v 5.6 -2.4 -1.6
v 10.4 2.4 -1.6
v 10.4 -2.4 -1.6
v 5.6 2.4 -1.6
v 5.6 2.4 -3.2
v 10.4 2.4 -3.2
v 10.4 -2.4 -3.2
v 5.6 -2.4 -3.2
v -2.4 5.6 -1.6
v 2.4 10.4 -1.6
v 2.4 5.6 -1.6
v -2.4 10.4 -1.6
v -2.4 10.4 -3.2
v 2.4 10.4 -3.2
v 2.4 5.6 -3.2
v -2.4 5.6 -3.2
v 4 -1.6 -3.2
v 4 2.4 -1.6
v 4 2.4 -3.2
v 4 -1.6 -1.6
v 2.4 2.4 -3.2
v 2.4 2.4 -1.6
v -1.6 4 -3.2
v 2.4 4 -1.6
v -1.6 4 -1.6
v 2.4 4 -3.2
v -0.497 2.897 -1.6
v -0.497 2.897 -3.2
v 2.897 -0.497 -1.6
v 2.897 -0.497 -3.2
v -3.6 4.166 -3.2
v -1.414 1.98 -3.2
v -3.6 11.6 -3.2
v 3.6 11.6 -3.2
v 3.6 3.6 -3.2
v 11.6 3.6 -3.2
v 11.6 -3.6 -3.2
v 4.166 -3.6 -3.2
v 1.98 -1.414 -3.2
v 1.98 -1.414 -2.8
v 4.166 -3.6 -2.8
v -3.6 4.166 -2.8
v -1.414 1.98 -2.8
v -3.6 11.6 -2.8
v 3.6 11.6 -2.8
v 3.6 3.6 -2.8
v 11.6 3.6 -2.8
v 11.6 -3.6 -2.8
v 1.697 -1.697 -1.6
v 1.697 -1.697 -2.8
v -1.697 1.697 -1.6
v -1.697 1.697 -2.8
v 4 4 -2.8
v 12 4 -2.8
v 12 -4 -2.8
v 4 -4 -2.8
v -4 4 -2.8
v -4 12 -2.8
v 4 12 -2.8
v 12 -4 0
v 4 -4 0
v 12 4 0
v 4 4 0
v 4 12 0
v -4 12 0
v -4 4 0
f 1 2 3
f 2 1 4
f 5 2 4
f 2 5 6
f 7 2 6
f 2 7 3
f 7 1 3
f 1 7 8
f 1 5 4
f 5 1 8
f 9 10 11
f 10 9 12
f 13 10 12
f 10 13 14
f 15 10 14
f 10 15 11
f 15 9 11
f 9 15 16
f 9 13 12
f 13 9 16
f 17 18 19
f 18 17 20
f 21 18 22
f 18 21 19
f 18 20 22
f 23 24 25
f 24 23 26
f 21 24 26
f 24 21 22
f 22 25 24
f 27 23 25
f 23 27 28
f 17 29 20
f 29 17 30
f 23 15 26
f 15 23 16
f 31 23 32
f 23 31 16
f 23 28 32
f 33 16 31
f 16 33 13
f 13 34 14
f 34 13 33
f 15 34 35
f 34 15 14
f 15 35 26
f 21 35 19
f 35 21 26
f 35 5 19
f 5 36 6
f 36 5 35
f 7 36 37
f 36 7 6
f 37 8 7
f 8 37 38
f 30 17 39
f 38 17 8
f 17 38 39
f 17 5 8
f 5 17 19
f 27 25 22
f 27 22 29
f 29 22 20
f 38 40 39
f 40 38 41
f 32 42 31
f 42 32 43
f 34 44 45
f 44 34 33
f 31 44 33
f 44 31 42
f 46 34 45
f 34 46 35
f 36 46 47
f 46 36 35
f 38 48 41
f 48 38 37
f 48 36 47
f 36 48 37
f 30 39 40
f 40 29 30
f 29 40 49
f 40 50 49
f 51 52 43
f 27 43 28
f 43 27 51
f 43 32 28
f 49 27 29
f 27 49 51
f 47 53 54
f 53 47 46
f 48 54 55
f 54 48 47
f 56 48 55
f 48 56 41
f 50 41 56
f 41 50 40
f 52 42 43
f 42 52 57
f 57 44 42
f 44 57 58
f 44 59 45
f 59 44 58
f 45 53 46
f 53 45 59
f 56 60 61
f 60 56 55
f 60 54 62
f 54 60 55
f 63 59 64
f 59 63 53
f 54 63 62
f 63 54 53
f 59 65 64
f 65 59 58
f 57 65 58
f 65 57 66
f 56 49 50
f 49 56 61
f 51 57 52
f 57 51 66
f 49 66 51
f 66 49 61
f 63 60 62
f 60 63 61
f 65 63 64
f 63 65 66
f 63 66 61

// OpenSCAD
// file: ../p/4-4edge.scad
use <../lib.scad>
$fa=1; $fs=0.2;
function ldraw_lib__4_4edge(realsolid=false) = [
// 0 Circle 1.0
// 0 Name: 4-4edge.dat
// 0 Author: James Jessiman
// 0 !LDRAW_ORG Primitive UPDATE 2017-01
// 0 !LICENSE Licensed under CC BY 2.0 and CC BY 4.0 : see CAreadme.txt
// 
// 0 BFC CERTIFY CCW
  [0,"BFC","CERTIFY"],
  [0,"BFC","CCW"],
// 
// 0 !HISTORY 1998-12-15 [PTadmin] Official Update 1998-10
// 0 !HISTORY 2005-12-28 [PTadmin] Official Update 2005-01
// 0 !HISTORY 2007-06-24 [PTadmin] Header formatted for Contributor Agreement
// 0 !HISTORY 2008-07-01 [PTadmin] Official Update 2008-01
// 0 !HISTORY 2017-01-15 [Steffen] BFCed
// 0 !HISTORY 2017-12-30 [PTadmin] Official Update 2017-01
// 
// 
// 2 24 1 0 0 0.9239 0 0.3827
  [2,24,1,0,0,0.9239,0,0.3827],
// 2 24 0.9239 0 0.3827 0.7071 0 0.7071
  [2,24,0.9239,0,0.3827,0.7071,0,0.7071],
// 2 24 0.7071 0 0.7071 0.3827 0 0.9239
  [2,24,0.7071,0,0.7071,0.3827,0,0.9239],
// 2 24 0.3827 0 0.9239 0 0 1
  [2,24,0.3827,0,0.9239,0,0,1],
// 2 24 0 0 1 -0.3827 0 0.9239
  [2,24,0,0,1,-0.3827,0,0.9239],
// 2 24 -0.3827 0 0.9239 -0.7071 0 0.7071
  [2,24,-0.3827,0,0.9239,-0.7071,0,0.7071],
// 2 24 -0.7071 0 0.7071 -0.9239 0 0.3827
  [2,24,-0.7071,0,0.7071,-0.9239,0,0.3827],
// 2 24 -0.9239 0 0.3827 -1 0 -0
  [2,24,-0.9239,0,0.3827,-1,0,-0],
// 2 24 -1 0 -0 -0.9239 0 -0.3827
  [2,24,-1,0,-0,-0.9239,0,-0.3827],
// 2 24 -0.9239 0 -0.3827 -0.7071 0 -0.7071
  [2,24,-0.9239,0,-0.3827,-0.7071,0,-0.7071],
// 2 24 -0.7071 0 -0.7071 -0.3827 0 -0.9239
  [2,24,-0.7071,0,-0.7071,-0.3827,0,-0.9239],
// 2 24 -0.3827 0 -0.9239 0 0 -1
  [2,24,-0.3827,0,-0.9239,0,0,-1],
// 2 24 0 0 -1 0.3827 0 -0.9239
  [2,24,0,0,-1,0.3827,0,-0.9239],
// 2 24 0.3827 0 -0.9239 0.7071 0 -0.7071
  [2,24,0.3827,0,-0.9239,0.7071,0,-0.7071],
// 2 24 0.7071 0 -0.7071 0.9239 0 -0.3827
  [2,24,0.7071,0,-0.7071,0.9239,0,-0.3827],
// 2 24 0.9239 0 -0.3827 1 0 0
  [2,24,0.9239,0,-0.3827,1,0,0],
];
module ldraw_lib__4_4edge(step=0, col=false, unit=2/5, alt=false, line=0.2, solid=!$preview)
    makepoly(ldraw_lib__4_4edge(solid), step=step, col=col, unit=unit, alt=alt, line=line, solid=solid);
ldraw_lib__4_4edge(line=0.2);
// file: ../p/4-4disc.scad
use <../lib.scad>
$fa=1; $fs=0.2;
function ldraw_lib__4_4disc(realsolid=false) = [
// 0 Disc 1.0
// 0 Name: 4-4disc.dat
// 0 Author: James Jessiman
// 0 !LDRAW_ORG Primitive UPDATE 2002-02
// 0 !LICENSE Licensed under CC BY 2.0 and CC BY 4.0 : see CAreadme.txt
// 
// 0 BFC CERTIFY CCW
  [0,"BFC","CERTIFY"],
  [0,"BFC","CCW"],
// 
// 0 !HISTORY 1998-12-15 [PTadmin] Official Update 1998-10
// 0 !HISTORY 2002-03-23 [sbliss] Added BFC statement
// 0 !HISTORY 2002-04-25 [PTadmin] Official Update 2002-02
// 0 !HISTORY 2007-06-24 [PTadmin] Header formatted for Contributor Agreement
// 0 !HISTORY 2008-07-01 [PTadmin] Official Update 2008-01
// 
// 
// 3 16 0 0 0 1 0 0 0.9239 0 0.3827
  [3,16,0,0,0,1,0,0,0.9239,0,0.3827],
// 3 16 0 0 0 0.9239 0 0.3827 0.7071 0 0.7071
  [3,16,0,0,0,0.9239,0,0.3827,0.7071,0,0.7071],
// 3 16 0 0 0 0.7071 0 0.7071 0.3827 0 0.9239
  [3,16,0,0,0,0.7071,0,0.7071,0.3827,0,0.9239],
// 3 16 0 0 0 0.3827 0 0.9239 0 0 1
  [3,16,0,0,0,0.3827,0,0.9239,0,0,1],
// 3 16 0 0 0 0 0 1 -0.3827 0 0.9239
  [3,16,0,0,0,0,0,1,-0.3827,0,0.9239],
// 3 16 0 0 0 -0.3827 0 0.9239 -0.7071 0 0.7071
  [3,16,0,0,0,-0.3827,0,0.9239,-0.7071,0,0.7071],
// 3 16 0 0 0 -0.7071 0 0.7071 -0.9239 0 0.3827
  [3,16,0,0,0,-0.7071,0,0.7071,-0.9239,0,0.3827],
// 3 16 0 0 0 -0.9239 0 0.3827 -1 0 -0
  [3,16,0,0,0,-0.9239,0,0.3827,-1,0,-0],
// 3 16 0 0 0 -1 0 -0 -0.9239 0 -0.3827
  [3,16,0,0,0,-1,0,-0,-0.9239,0,-0.3827],
// 3 16 0 0 0 -0.9239 0 -0.3827 -0.7071 0 -0.7071
  [3,16,0,0,0,-0.9239,0,-0.3827,-0.7071,0,-0.7071],
// 3 16 0 0 0 -0.7071 0 -0.7071 -0.3827 0 -0.9239
  [3,16,0,0,0,-0.7071,0,-0.7071,-0.3827,0,-0.9239],
// 3 16 0 0 0 -0.3827 0 -0.9239 0 0 -1
  [3,16,0,0,0,-0.3827,0,-0.9239,0,0,-1],
// 3 16 0 0 0 0 0 -1 0.3827 0 -0.9239
  [3,16,0,0,0,0,0,-1,0.3827,0,-0.9239],
// 3 16 0 0 0 0.3827 0 -0.9239 0.7071 0 -0.7071
  [3,16,0,0,0,0.3827,0,-0.9239,0.7071,0,-0.7071],
// 3 16 0 0 0 0.7071 0 -0.7071 0.9239 0 -0.3827
  [3,16,0,0,0,0.7071,0,-0.7071,0.9239,0,-0.3827],
// 3 16 0 0 0 0.9239 0 -0.3827 1 0 0
  [3,16,0,0,0,0.9239,0,-0.3827,1,0,0],
// 0
];
module ldraw_lib__4_4disc(step=0, col=false, unit=2/5, alt=false, line=0.2, solid=!$preview)
    makepoly(ldraw_lib__4_4disc(solid), step=step, col=col, unit=unit, alt=alt, line=line, solid=solid);
ldraw_lib__4_4disc(line=0.2);
// file: ../p/4-4cyli.scad
use <../lib.scad>
$fa=1; $fs=0.2;
function ldraw_lib__4_4cyli(realsolid=false) = [
// 0 Cylinder 1.0
// 0 Name: 4-4cyli.dat
// 0 Author: James Jessiman
// 0 !LDRAW_ORG Primitive UPDATE 2005-01
// 0 !LICENSE Licensed under CC BY 2.0 and CC BY 4.0 : see CAreadme.txt
// 
// 0 BFC CERTIFY CCW
  [0,"BFC","CERTIFY"],
  [0,"BFC","CCW"],
// 
// 0 !HISTORY 1998-12-15 [PTadmin] Official Update 1998-10
// 0 !HISTORY 2002-03-23 [sbliss] Added BFC statement; merged headers from files in distributions LDraw 0.27 and Complete.
// 0 !HISTORY 2002-04-25 [PTadmin] Official Update 2002-02
// 0 !HISTORY 2004-12-14 [guyvivan] BFC CCW
// 0 !HISTORY 2005-12-28 [PTadmin] Official Update 2005-01
// 0 !HISTORY 2007-06-24 [PTadmin] Header formatted for Contributor Agreement
// 0 !HISTORY 2008-07-01 [PTadmin] Official Update 2008-01
// 
// 
// 4 16 1 1 0 0.9239 1 0.3827 0.9239 0 0.3827 1 0 0
  [4,16,1,1,0,0.9239,1,0.3827,0.9239,0,0.3827,1,0,0],
// 5 24 1 0 0 1 1 0 0.9239 0 0.3827 0.9239 0 -0.3827
  [5,24,1,0,0,1,1,0,0.9239,0,0.3827,0.9239,0,-0.3827],
// 4 16 0.9239 1 0.3827 0.7071 1 0.7071 0.7071 0 0.7071 0.9239 0 0.3827
  [4,16,0.9239,1,0.3827,0.7071,1,0.7071,0.7071,0,0.7071,0.9239,0,0.3827],
// 5 24 0.9239 0 0.3827 0.9239 1 0.3827 0.7071 0 0.7071 1 0 0
  [5,24,0.9239,0,0.3827,0.9239,1,0.3827,0.7071,0,0.7071,1,0,0],
// 4 16 0.7071 1 0.7071 0.3827 1 0.9239 0.3827 0 0.9239 0.7071 0 0.7071
  [4,16,0.7071,1,0.7071,0.3827,1,0.9239,0.3827,0,0.9239,0.7071,0,0.7071],
// 5 24 0.7071 0 0.7071 0.7071 1 0.7071 0.3827 0 0.9239 0.9239 0 0.3827
  [5,24,0.7071,0,0.7071,0.7071,1,0.7071,0.3827,0,0.9239,0.9239,0,0.3827],
// 4 16 0.3827 1 0.9239 0 1 1 0 0 1 0.3827 0 0.9239
  [4,16,0.3827,1,0.9239,0,1,1,0,0,1,0.3827,0,0.9239],
// 5 24 0.3827 0 0.9239 0.3827 1 0.9239 0 0 1 0.7071 0 0.7071
  [5,24,0.3827,0,0.9239,0.3827,1,0.9239,0,0,1,0.7071,0,0.7071],
// 4 16 0 1 1 -0.3827 1 0.9239 -0.3827 0 0.9239 0 0 1
  [4,16,0,1,1,-0.3827,1,0.9239,-0.3827,0,0.9239,0,0,1],
// 5 24 0 0 1 0 1 1 -0.3827 0 0.9239 0.3827 0 0.9239
  [5,24,0,0,1,0,1,1,-0.3827,0,0.9239,0.3827,0,0.9239],
// 4 16 -0.3827 1 0.9239 -0.7071 1 0.7071 -0.7071 0 0.7071 -0.3827 0 0.9239
  [4,16,-0.3827,1,0.9239,-0.7071,1,0.7071,-0.7071,0,0.7071,-0.3827,0,0.9239],
// 5 24 -0.3827 0 0.9239 -0.3827 1 0.9239 -0.7071 0 0.7071 0 0 1
  [5,24,-0.3827,0,0.9239,-0.3827,1,0.9239,-0.7071,0,0.7071,0,0,1],
// 4 16 -0.7071 1 0.7071 -0.9239 1 0.3827 -0.9239 0 0.3827 -0.7071 0 0.7071
  [4,16,-0.7071,1,0.7071,-0.9239,1,0.3827,-0.9239,0,0.3827,-0.7071,0,0.7071],
// 5 24 -0.7071 0 0.7071 -0.7071 1 0.7071 -0.9239 0 0.3827 -0.3827 0 0.9239
  [5,24,-0.7071,0,0.7071,-0.7071,1,0.7071,-0.9239,0,0.3827,-0.3827,0,0.9239],
// 4 16 -0.9239 1 0.3827 -1 1 0 -1 0 0 -0.9239 0 0.3827
  [4,16,-0.9239,1,0.3827,-1,1,0,-1,0,0,-0.9239,0,0.3827],
// 5 24 -0.9239 0 0.3827 -0.9239 1 0.3827 -1 0 0 -0.7071 0 0.7071
  [5,24,-0.9239,0,0.3827,-0.9239,1,0.3827,-1,0,0,-0.7071,0,0.7071],
// 4 16 -1 1 0 -0.9239 1 -0.3827 -0.9239 0 -0.3827 -1 0 0
  [4,16,-1,1,0,-0.9239,1,-0.3827,-0.9239,0,-0.3827,-1,0,0],
// 5 24 -1 0 0 -1 1 0 -0.9239 0 -0.3827 -0.9239 0 0.3827
  [5,24,-1,0,0,-1,1,0,-0.9239,0,-0.3827,-0.9239,0,0.3827],
// 4 16 -0.9239 1 -0.3827 -0.7071 1 -0.7071 -0.7071 0 -0.7071 -0.9239 0 -0.3827
  [4,16,-0.9239,1,-0.3827,-0.7071,1,-0.7071,-0.7071,0,-0.7071,-0.9239,0,-0.3827],
// 5 24 -0.9239 0 -0.3827 -0.9239 1 -0.3827 -0.7071 0 -0.7071 -1 0 0
  [5,24,-0.9239,0,-0.3827,-0.9239,1,-0.3827,-0.7071,0,-0.7071,-1,0,0],
// 4 16 -0.7071 1 -0.7071 -0.3827 1 -0.9239 -0.3827 0 -0.9239 -0.7071 0 -0.7071
  [4,16,-0.7071,1,-0.7071,-0.3827,1,-0.9239,-0.3827,0,-0.9239,-0.7071,0,-0.7071],
// 5 24 -0.7071 0 -0.7071 -0.7071 1 -0.7071 -0.3827 0 -0.9239 -0.9239 0 -0.3827
  [5,24,-0.7071,0,-0.7071,-0.7071,1,-0.7071,-0.3827,0,-0.9239,-0.9239,0,-0.3827],
// 4 16 -0.3827 1 -0.9239 0 1 -1 0 0 -1 -0.3827 0 -0.9239
  [4,16,-0.3827,1,-0.9239,0,1,-1,0,0,-1,-0.3827,0,-0.9239],
// 5 24 -0.3827 0 -0.9239 -0.3827 1 -0.9239 0 0 -1 -0.7071 0 -0.7071
  [5,24,-0.3827,0,-0.9239,-0.3827,1,-0.9239,0,0,-1,-0.7071,0,-0.7071],
// 4 16 0 1 -1 0.3827 1 -0.9239 0.3827 0 -0.9239 0 0 -1
  [4,16,0,1,-1,0.3827,1,-0.9239,0.3827,0,-0.9239,0,0,-1],
// 5 24 0 0 -1 0 1 -1 0.3827 0 -0.9239 -0.3827 0 -0.9239
  [5,24,0,0,-1,0,1,-1,0.3827,0,-0.9239,-0.3827,0,-0.9239],
// 4 16 0.3827 1 -0.9239 0.7071 1 -0.7071 0.7071 0 -0.7071 0.3827 0 -0.9239
  [4,16,0.3827,1,-0.9239,0.7071,1,-0.7071,0.7071,0,-0.7071,0.3827,0,-0.9239],
// 5 24 0.3827 0 -0.9239 0.3827 1 -0.9239 0.7071 0 -0.7071 0 0 -1
  [5,24,0.3827,0,-0.9239,0.3827,1,-0.9239,0.7071,0,-0.7071,0,0,-1],
// 4 16 0.7071 1 -0.7071 0.9239 1 -0.3827 0.9239 0 -0.3827 0.7071 0 -0.7071
  [4,16,0.7071,1,-0.7071,0.9239,1,-0.3827,0.9239,0,-0.3827,0.7071,0,-0.7071],
// 5 24 0.7071 0 -0.7071 0.7071 1 -0.7071 0.9239 0 -0.3827 0.3827 0 -0.9239
  [5,24,0.7071,0,-0.7071,0.7071,1,-0.7071,0.9239,0,-0.3827,0.3827,0,-0.9239],
// 4 16 0.9239 1 -0.3827 1 1 0 1 0 0 0.9239 0 -0.3827
  [4,16,0.9239,1,-0.3827,1,1,0,1,0,0,0.9239,0,-0.3827],
// 5 24 0.9239 0 -0.3827 0.9239 1 -0.3827 1 0 0 0.7071 0 -0.7071
  [5,24,0.9239,0,-0.3827,0.9239,1,-0.3827,1,0,0,0.7071,0,-0.7071],
// 0
];
module ldraw_lib__4_4cyli(step=0, col=false, unit=2/5, alt=false, line=0.2, solid=!$preview)
    makepoly(ldraw_lib__4_4cyli(solid), step=step, col=col, unit=unit, alt=alt, line=line, solid=solid);
ldraw_lib__4_4cyli(line=0.2);
// file: ../p/stud3.scad
use <../lib.scad>
use <4-4cyli.scad>
use <4-4disc.scad>
use <4-4edge.scad>
$fa=1; $fs=0.2;
function ldraw_lib__stud3(realsolid=false) = realsolid ? 
    [openscad(translate([0,0,-eps()], o=cylinder(4+eps(), r=4)),2)] : [
// 0 Stud Tube Solid
// 0 Name: stud3.dat
// 0 Author: James Jessiman
// 0 !LDRAW_ORG Primitive UPDATE 2012-01
// 0 !LICENSE Licensed under CC BY 2.0 and CC BY 4.0 : see CAreadme.txt
// 
// 0 BFC CERTIFY CCW
  [0,"BFC","CERTIFY"],
  [0,"BFC","CCW"],
// 
// 0 !HISTORY 2002-04-04 [sbliss] Modified for BFC compliance
// 0 !HISTORY 2002-04-25 [PTadmin] Official Update 2002-02
// 0 !HISTORY 2007-06-24 [PTadmin] Header formatted for Contributor Agreement
// 0 !HISTORY 2008-07-01 [PTadmin] Official Update 2008-01
// 0 !HISTORY 2012-02-16 [Philo] Changed to CCW
// 0 !HISTORY 2012-03-30 [PTadmin] Official Update 2012-01
// 
// 
// 1 16 0 -4 0 4 0 0 0 1 0 0 0 4 4-4edge.dat
  [1,16,0,-4,0,4,0,0,0,1,0,0,0,4, ldraw_lib__4_4edge(realsolid)],
// 1 16 0 0 0 4 0 0 0 1 0 0 0 4 4-4edge.dat
  [1,16,0,0,0,4,0,0,0,1,0,0,0,4, ldraw_lib__4_4edge(realsolid)],
// 1 16 0 -4 0 4 0 0 0 1 0 0 0 4 4-4disc.dat
  [1,16,0,-4,0,4,0,0,0,1,0,0,0,4, ldraw_lib__4_4disc(realsolid)],
// 1 16 0 -4 0 4 0 0 0 4 0 0 0 4 4-4cyli.dat
  [1,16,0,-4,0,4,0,0,0,4,0,0,0,4, ldraw_lib__4_4cyli(realsolid)],
];
module ldraw_lib__stud3(step=0, col=false, unit=2/5, alt=false, line=0.2, solid=!$preview)
    makepoly(ldraw_lib__stud3(solid), step=step, col=col, unit=unit, alt=alt, line=line, solid=solid);
ldraw_lib__stud3(line=0.2);
// file: ../p/stud.scad
use <../lib.scad>
use <4-4cyli.scad>
use <4-4disc.scad>
use <4-4edge.scad>
$fa=1; $fs=0.2;
function ldraw_lib__stud(realsolid=false) = realsolid ? 
    [openscad(translate([0,0,-eps()], o=cylinder(4+eps(), r=6)),2)] : [
// 0 Stud
// 0 Name: stud.dat
// 0 Author: James Jessiman
// 0 !LDRAW_ORG Primitive UPDATE 2012-01
// 0 !LICENSE Licensed under CC BY 2.0 and CC BY 4.0 : see CAreadme.txt
// 
// 0 BFC CERTIFY CCW
  [0,"BFC","CERTIFY"],
  [0,"BFC","CCW"],
// 
// 0 !HISTORY 2002-04-04 [sbliss] Modified for BFC compliance
// 0 !HISTORY 2002-04-25 [PTadmin] Official Update 2002-02
// 0 !HISTORY 2007-06-24 [PTadmin] Header formatted for Contributor Agreement
// 0 !HISTORY 2008-07-01 [PTadmin] Official Update 2008-01
// 0 !HISTORY 2012-02-16 [Philo] Changed to CCW
// 0 !HISTORY 2012-03-30 [PTadmin] Official Update 2012-01
// 
// 
// 1 16 0 0 0 6 0 0 0 1 0 0 0 6 4-4edge.dat
  [1,16,0,0,0,6,0,0,0,1,0,0,0,6, ldraw_lib__4_4edge(realsolid)],
// 1 16 0 -4 0 6 0 0 0 1 0 0 0 6 4-4edge.dat
  [1,16,0,-4,0,6,0,0,0,1,0,0,0,6, ldraw_lib__4_4edge(realsolid)],
// 1 16 0 0 0 6 0 0 0 -4 0 0 0 6 4-4cyli.dat
  [1,16,0,0,0,6,0,0,0,-4,0,0,0,6, ldraw_lib__4_4cyli(realsolid)],
// 1 16 0 -4 0 6 0 0 0 1 0 0 0 6 4-4disc.dat
  [1,16,0,-4,0,6,0,0,0,1,0,0,0,6, ldraw_lib__4_4disc(realsolid)],
];
module ldraw_lib__stud(step=0, col=false, unit=2/5, alt=false, line=0.2, solid=!$preview)
    makepoly(ldraw_lib__stud(solid), step=step, col=col, unit=unit, alt=alt, line=line, solid=solid);
ldraw_lib__stud(line=0.2);
// file: ../p/box4t.scad
use <../lib.scad>
$fa=1; $fs=0.2;
function ldraw_lib__box4t(realsolid=false) = [
// 0 Box with 4 Adjacent Faces and All Edges
// 0 Name: box4t.dat
// 0 Author: Tore Eriksson [Tore_Eriksson]
// 0 !LDRAW_ORG Primitive UPDATE 2003-02
// 0 !LICENSE Licensed under CC BY 2.0 and CC BY 4.0 : see CAreadme.txt
// 
// 0 BFC CERTIFY CCW
  [0,"BFC","CERTIFY"],
  [0,"BFC","CCW"],
// 
// 0 !HISTORY 1997-09-29 [PTadmin] Official Update 1997-15
// 0 !HISTORY 2002-08-31 [izanette] Modified with WINDZ for BFC compliance
// 0 !HISTORY 2003-08-01 [PTadmin] Official Update 2003-02
// 0 !HISTORY 2007-06-24 [PTadmin] Header formatted for Contributor Agreement
// 0 !HISTORY 2008-07-01 [PTadmin] Official Update 2008-01
// 
// 
// 2 24 1 1 1 -1 1 1
  [2,24,1,1,1,-1,1,1],
// 2 24 -1 1 1 -1 1 -1
  [2,24,-1,1,1,-1,1,-1],
// 2 24 -1 1 -1 1 1 -1
  [2,24,-1,1,-1,1,1,-1],
// 2 24 1 1 -1 1 1 1
  [2,24,1,1,-1,1,1,1],
// 2 24 1 0 1 -1 0 1
  [2,24,1,0,1,-1,0,1],
// 2 24 -1 0 1 -1 0 -1
  [2,24,-1,0,1,-1,0,-1],
// 2 24 -1 0 -1 1 0 -1
  [2,24,-1,0,-1,1,0,-1],
// 2 24 1 0 -1 1 0 1
  [2,24,1,0,-1,1,0,1],
// 2 24 1 0 1 1 1 1
  [2,24,1,0,1,1,1,1],
// 2 24 -1 0 1 -1 1 1
  [2,24,-1,0,1,-1,1,1],
// 2 24 1 0 -1 1 1 -1
  [2,24,1,0,-1,1,1,-1],
// 2 24 -1 0 -1 -1 1 -1
  [2,24,-1,0,-1,-1,1,-1],
// 4 16 1 1 1 1 1 -1 -1 1 -1 -1 1 1
  [4,16,1,1,1,1,1,-1,-1,1,-1,-1,1,1],
// 4 16 1 1 1 -1 1 1 -1 0 1 1 0 1
  [4,16,1,1,1,-1,1,1,-1,0,1,1,0,1],
// 4 16 -1 1 1 -1 1 -1 -1 0 -1 -1 0 1
  [4,16,-1,1,1,-1,1,-1,-1,0,-1,-1,0,1],
// 0 4 16 -1 1 -1 -1 0 -1 1 0 -1 1 1 -1
// 4 16 1 1 -1 1 1 1 1 0 1 1 0 -1
  [4,16,1,1,-1,1,1,1,1,0,1,1,0,-1],
// 0
];
module ldraw_lib__box4t(step=0, col=false, unit=2/5, alt=false, line=0.2, solid=!$preview)
    makepoly(ldraw_lib__box4t(solid), step=step, col=col, unit=unit, alt=alt, line=line, solid=solid);
ldraw_lib__box4t(line=0.2);
// file: s/3004s01.scad
use <../../lib.scad>
use <../../p/box4t.scad>
use <../../p/box5.scad>
use <../../p/stud.scad>
use <../../p/stud3.scad>
$fa=1; $fs=0.2;
function ldraw_lib__s__3004s01(realsolid=false) = [
// 0 ~Brick  1 x  2 without Front Face
// 0 Name: s\3004s01.dat
// 0 Author: James Jessiman
// 0 !LDRAW_ORG Subpart UPDATE 2003-03
// 0 !LICENSE Licensed under CC BY 2.0 and CC BY 4.0 : see CAreadme.txt
// 
// 0 BFC CERTIFY CCW
  [0,"BFC","CERTIFY"],
  [0,"BFC","CCW"],
// 
// 0 !HISTORY 2003-09-07 [jriley] Subfiling, BFC
// 0 !HISTORY 2003-12-19 [PTadmin] Official Update 2003-03
// 0 !HISTORY 2007-08-29 [PTadmin] Header formatted for Contributor Agreement
// 0 !HISTORY 2008-07-01 [PTadmin] Official Update 2008-01
// 
// 
// 1 16 0 4 0 1 0 0 0 -5 0 0 0 1 stud3.dat
  [1,16,0,4,0,1,0,0,0,-5,0,0,0,1, ldraw_lib__stud3(realsolid)],
// 0 BFC INVERTNEXT
  [0,"BFC","INVERTNEXT"],
// 1 16 0 24 0 16 0 0 0 -20 0 0 0 6 box5.dat
  [1,16,0,24,0,16,0,0,0,-20,0,0,0,6, ldraw_lib__box5(realsolid)],
// 4 16 20 24 10 16 24 6 -16 24 6 -20 24 10
  [4,16,20,24,10,16,24,6,-16,24,6,-20,24,10],
// 4 16 -20 24 10 -16 24 6 -16 24 -6 -20 24 -10
  [4,16,-20,24,10,-16,24,6,-16,24,-6,-20,24,-10],
// 4 16 -20 24 -10 -16 24 -6 16 24 -6 20 24 -10
  [4,16,-20,24,-10,-16,24,-6,16,24,-6,20,24,-10],
// 4 16 20 24 -10 16 24 -6 16 24 6 20 24 10
  [4,16,20,24,-10,16,24,-6,16,24,6,20,24,10],
// 1 16 0 24 0 20 0 0 0 -24 0 0 0 10 box4t.dat
  [1,16,0,24,0,20,0,0,0,-24,0,0,0,10, ldraw_lib__box4t(realsolid)],
// 1 16 10 0 0 1 0 0 0 1 0 0 0 1 stud.dat
  [1,16,10,0,0,1,0,0,0,1,0,0,0,1, ldraw_lib__stud(realsolid)],
// 1 16 -10 0 0 1 0 0 0 1 0 0 0 1 stud.dat
  [1,16,-10,0,0,1,0,0,0,1,0,0,0,1, ldraw_lib__stud(realsolid)],
// 0
];
module ldraw_lib__s__3004s01(step=0, col=false, unit=2/5, alt=false, line=0.2, solid=!$preview)
    makepoly(ldraw_lib__s__3004s01(solid), step=step, col=col, unit=unit, alt=alt, line=line, solid=solid);
ldraw_lib__s__3004s01(line=0.2);
// file: 3004.scad
use <../lib.scad>
use <s/3004s01.scad>
$fa=1; $fs=0.2;
function ldraw_lib__3004(realsolid=false) = [
// 0 Brick  1 x  2
// 0 Name: 3004.dat
// 0 Author: James Jessiman
// 0 !LDRAW_ORG Part UPDATE 2022-05
// 0 !LICENSE Licensed under CC BY 2.0 and CC BY 4.0 : see CAreadme.txt
// 
// 0 BFC CERTIFY CCW
  [0,"BFC","CERTIFY"],
  [0,"BFC","CCW"],
// 
// 0 !HISTORY 2001-10-26 [PTadmin] Official Update 2001-01
// 0 !HISTORY 2002-05-07 {unknown} BFC Certification
// 0 !HISTORY 2002-06-11 [PTadmin] Official Update 2002-03
// 0 !HISTORY 2007-05-07 [PTadmin] Header formatted for Contributor Agreement
// 0 !HISTORY 2008-07-01 [PTadmin] Official Update 2008-01
// 0 !HISTORY 2022-08-04 [MagFors] Using subfile
// 0 !HISTORY 2022-09-15 [PTadmin] Official Update 2022-05
// 
// 
// 1 16 0 0 0 1 0 0 0 1 0 0 0 1 s\3004s01.dat
  [1,16,0,0,0,1,0,0,0,1,0,0,0,1, ldraw_lib__s__3004s01(realsolid)],
// 4 16 -20 24 -10 20 24 -10 20 0 -10 -20 0 -10
  [4,16,-20,24,-10,20,24,-10,20,0,-10,-20,0,-10],
];
module ldraw_lib__3004(step=0, col=false, unit=2/5, alt=false, line=0.2, solid=!$preview)
    makepoly(ldraw_lib__3004(solid), step=step, col=col, unit=unit, alt=alt, line=line, solid=solid);
ldraw_lib__3004(line=0.2);
// file: ../p/tri3a4.scad
use <../lib.scad>
$fa=1; $fs=0.2;
function ldraw_lib__tri3a4(realsolid=false) = [
// 0 Triangular Prism with 3 Adjacent Faces without 4 Edges
// 0 Name: tri3a4.dat
// 0 Author: Magnus Forsberg [MagFors]
// 0 !LDRAW_ORG Primitive UPDATE 2017-01
// 0 !LICENSE Licensed under CC BY 2.0 and CC BY 4.0 : see CAreadme.txt
// 
// 0 BFC CERTIFY CCW
  [0,"BFC","CERTIFY"],
  [0,"BFC","CCW"],
// 
// 0 !HISTORY 2017-12-30 [PTadmin] Official Update 2017-01
// 
// 
// 2 24 0 1 1 0 1 0
  [2,24,0,1,1,0,1,0],
// 2 24 0 1 0 1 1 0
  [2,24,0,1,0,1,1,0],
// 2 24 0 0 1 0 0 0
  [2,24,0,0,1,0,0,0],
// 2 24 0 0 0 1 0 0
  [2,24,0,0,0,1,0,0],
// 2 24 0 0 0 0 1 0
  [2,24,0,0,0,0,1,0],
// 4 16 0 1 1 0 1 0 0 0 0 0 0 1
  [4,16,0,1,1,0,1,0,0,0,0,0,0,1],
// 4 16 0 1 0 1 1 0 1 0 0 0 0 0
  [4,16,0,1,0,1,1,0,1,0,0,0,0,0],
// 3 16 0 1 0 0 1 1 1 1 0
  [3,16,0,1,0,0,1,1,1,1,0],
];
module ldraw_lib__tri3a4(step=0, col=false, unit=2/5, alt=false, line=0.2, solid=!$preview)
    makepoly(ldraw_lib__tri3a4(solid), step=step, col=col, unit=unit, alt=alt, line=line, solid=solid);
ldraw_lib__tri3a4(line=0.2);
// file: ../p/rect3.scad
use <../lib.scad>
$fa=1; $fs=0.2;
function ldraw_lib__rect3(realsolid=false) = [
// 0 Rectangle with 3 Edges
// 0 Name: rect3.dat
// 0 Author: Mark Kennedy [mkennedy]
// 0 !LDRAW_ORG Primitive UPDATE 2010-01
// 0 !LICENSE Licensed under CC BY 2.0 and CC BY 4.0 : see CAreadme.txt
// 
// 0 BFC CERTIFY CCW
  [0,"BFC","CERTIFY"],
  [0,"BFC","CCW"],
// 
// 0 !HISTORY 2003-08-01 [PTadmin] Official Update 2003-02
// 0 !HISTORY 2007-06-24 [PTadmin] Header formatted for Contributor Agreement
// 0 !HISTORY 2008-07-01 [PTadmin] Official Update 2008-01
// 0 !HISTORY 2010-01-17 [mikeheide] Change winding to CCW
// 0 !HISTORY 2010-04-05 [PTadmin] Official Update 2010-01
// 
// 
// 2 24 1 0 1 -1 0 1
  [2,24,1,0,1,-1,0,1],
// 2 24 1 0 1 1 0 -1
  [2,24,1,0,1,1,0,-1],
// 2 24 -1 0 1 -1 0 -1
  [2,24,-1,0,1,-1,0,-1],
// 4 16 -1 0 1 -1 0 -1 1 0 -1 1 0 1
  [4,16,-1,0,1,-1,0,-1,1,0,-1,1,0,1],
// 0 //
];
module ldraw_lib__rect3(step=0, col=false, unit=2/5, alt=false, line=0.2, solid=!$preview)
    makepoly(ldraw_lib__rect3(solid), step=step, col=col, unit=unit, alt=alt, line=line, solid=solid);
ldraw_lib__rect3(line=0.2);
// file: ../p/rect.scad
use <../lib.scad>
$fa=1; $fs=0.2;
function ldraw_lib__rect(realsolid=false) = [
// 0 Rectangle
// 0 Name: rect.dat
// 0 Author: James Jessiman
// 0 !LDRAW_ORG Primitive UPDATE 2010-01
// 0 !LICENSE Licensed under CC BY 2.0 and CC BY 4.0 : see CAreadme.txt
// 
// 0 BFC CERTIFY CCW
  [0,"BFC","CERTIFY"],
  [0,"BFC","CCW"],
// 
// 0 !HISTORY 2002-04-05 [hafhead] Added BFC statement
// 0 !HISTORY 2002-04-25 [PTadmin] Official Update 2002-02
// 0 !HISTORY 2007-06-24 [PTadmin] Header formatted for Contributor Agreement
// 0 !HISTORY 2008-07-01 [PTadmin] Official Update 2008-01
// 0 !HISTORY 2010-01-17 [mikeheide] changed winding to CCW
// 0 !HISTORY 2010-04-05 [PTadmin] Official Update 2010-01
// 
// 
// 2 24 1 0 1 -1 0 1
  [2,24,1,0,1,-1,0,1],
// 2 24 -1 0 1 -1 0 -1
  [2,24,-1,0,1,-1,0,-1],
// 2 24 -1 0 -1 1 0 -1
  [2,24,-1,0,-1,1,0,-1],
// 2 24 1 0 -1 1 0 1
  [2,24,1,0,-1,1,0,1],
// 4 16 -1 0 1 -1 0 -1 1 0 -1 1 0 1
  [4,16,-1,0,1,-1,0,-1,1,0,-1,1,0,1],
// 0
];
module ldraw_lib__rect(step=0, col=false, unit=2/5, alt=false, line=0.2, solid=!$preview)
    makepoly(ldraw_lib__rect(solid), step=step, col=col, unit=unit, alt=alt, line=line, solid=solid);
ldraw_lib__rect(line=0.2);
// file: ../p/box5.scad
use <../lib.scad>
$fa=1; $fs=0.2;
function ldraw_lib__box5(realsolid=false) = [
// 0 Box with 5 Faces and All Edges
// 0 Name: box5.dat
// 0 Author: James Jessiman
// 0 !LDRAW_ORG Primitive UPDATE 2012-01
// 0 !LICENSE Licensed under CC BY 2.0 and CC BY 4.0 : see CAreadme.txt
// 
// 0 BFC CERTIFY CCW
  [0,"BFC","CERTIFY"],
  [0,"BFC","CCW"],
// 
// 0 !HISTORY 2002-04-03 [sbliss] Modified for BFC compliance
// 0 !HISTORY 2002-04-25 [PTadmin] Official Update 2002-02
// 0 !HISTORY 2007-06-24 [PTadmin] Header formatted for Contributor Agreement
// 0 !HISTORY 2008-07-01 [PTadmin] Official Update 2008-01
// 0 !HISTORY 2012-02-16 [Philo] Changed to CCW
// 0 !HISTORY 2012-03-30 [PTadmin] Official Update 2012-01
// 
// 
// 2 24 1 1 1 -1 1 1
  [2,24,1,1,1,-1,1,1],
// 2 24 -1 1 1 -1 1 -1
  [2,24,-1,1,1,-1,1,-1],
// 2 24 -1 1 -1 1 1 -1
  [2,24,-1,1,-1,1,1,-1],
// 2 24 1 1 -1 1 1 1
  [2,24,1,1,-1,1,1,1],
// 2 24 1 0 1 -1 0 1
  [2,24,1,0,1,-1,0,1],
// 2 24 -1 0 1 -1 0 -1
  [2,24,-1,0,1,-1,0,-1],
// 2 24 -1 0 -1 1 0 -1
  [2,24,-1,0,-1,1,0,-1],
// 2 24 1 0 -1 1 0 1
  [2,24,1,0,-1,1,0,1],
// 2 24 1 0 1 1 1 1
  [2,24,1,0,1,1,1,1],
// 2 24 -1 0 1 -1 1 1
  [2,24,-1,0,1,-1,1,1],
// 2 24 1 0 -1 1 1 -1
  [2,24,1,0,-1,1,1,-1],
// 2 24 -1 0 -1 -1 1 -1
  [2,24,-1,0,-1,-1,1,-1],
// 4 16 -1 1 1 1 1 1 1 1 -1 -1 1 -1
  [4,16,-1,1,1,1,1,1,1,1,-1,-1,1,-1],
// 4 16 -1 1 1 -1 0 1 1 0 1 1 1 1
  [4,16,-1,1,1,-1,0,1,1,0,1,1,1,1],
// 4 16 -1 1 -1 -1 0 -1 -1 0 1 -1 1 1
  [4,16,-1,1,-1,-1,0,-1,-1,0,1,-1,1,1],
// 4 16 1 1 -1 1 0 -1 -1 0 -1 -1 1 -1
  [4,16,1,1,-1,1,0,-1,-1,0,-1,-1,1,-1],
// 4 16 1 1 1 1 0 1 1 0 -1 1 1 -1
  [4,16,1,1,1,1,0,1,1,0,-1,1,1,-1],
];
module ldraw_lib__box5(step=0, col=false, unit=2/5, alt=false, line=0.2, solid=!$preview)
    makepoly(ldraw_lib__box5(solid), step=step, col=col, unit=unit, alt=alt, line=line, solid=solid);
ldraw_lib__box5(line=0.2);
// file: ../p/box2-7.scad
use <../lib.scad>
$fa=1; $fs=0.2;
function ldraw_lib__box2_7(realsolid=false) = [
// 0 Box with 2 Faces without 7 Edges
// 0 Name: box2-7.dat
// 0 Author: Guy Vivan [guyvivan]
// 0 !LDRAW_ORG Primitive UPDATE 2009-01
// 0 !LICENSE Licensed under CC BY 2.0 and CC BY 4.0 : see CAreadme.txt
// 
// 0 BFC CERTIFY CCW
  [0,"BFC","CERTIFY"],
  [0,"BFC","CCW"],
// 
// 0 !HISTORY 2009-05-02 [PTadmin] Official Update 2009-01
// 
// 
// 2 24 1 1 1 -1 1 1
  [2,24,1,1,1,-1,1,1],
// 2 24 -1 -1 1 -1 1 1
  [2,24,-1,-1,1,-1,1,1],
// 2 24 1 -1 1 1 1 1
  [2,24,1,-1,1,1,1,1],
// 2 24 -1 1 -1 -1 1 1
  [2,24,-1,1,-1,-1,1,1],
// 2 24 1 1 -1 1 1 1
  [2,24,1,1,-1,1,1,1],
// 4 16 1 1 1 1 1 -1 -1 1 -1 -1 1 1
  [4,16,1,1,1,1,1,-1,-1,1,-1,-1,1,1],
// 4 16 1 1 1 -1 1 1 -1 -1 1 1 -1 1
  [4,16,1,1,1,-1,1,1,-1,-1,1,1,-1,1],
// 0
];
module ldraw_lib__box2_7(step=0, col=false, unit=2/5, alt=false, line=0.2, solid=!$preview)
    makepoly(ldraw_lib__box2_7(solid), step=step, col=col, unit=unit, alt=alt, line=line, solid=solid);
ldraw_lib__box2_7(line=0.2);
// file: ../p/box2-5.scad
use <../lib.scad>
$fa=1; $fs=0.2;
function ldraw_lib__box2_5(realsolid=false) = [
// 0 Box with 2 Faces without 5 Edges
// 0 Name: box2-5.dat
// 0 Author: Steffen [Steffen]
// 0 !LDRAW_ORG Primitive UPDATE 2003-03
// 0 !LICENSE Licensed under CC BY 2.0 and CC BY 4.0 : see CAreadme.txt
// 
// 0 BFC CERTIFY CCW
  [0,"BFC","CERTIFY"],
  [0,"BFC","CCW"],
// 
// 0 !HISTORY 2003-12-19 [PTadmin] Official Update 2003-03
// 0 !HISTORY 2007-06-24 [PTadmin] Header formatted for Contributor Agreement
// 0 !HISTORY 2008-07-01 [PTadmin] Official Update 2008-01
// 
// 
// 2 24 1 1 1 -1 1 1
  [2,24,1,1,1,-1,1,1],
// 2 24 1 1 -1 -1 1 -1
  [2,24,1,1,-1,-1,1,-1],
// 2 24 1 -1 1 -1 -1 1
  [2,24,1,-1,1,-1,-1,1],
// 2 24 -1 -1 1 -1 1 1
  [2,24,-1,-1,1,-1,1,1],
// 2 24 1 -1 1 1 1 1
  [2,24,1,-1,1,1,1,1],
// 2 24 -1 1 -1 -1 1 1
  [2,24,-1,1,-1,-1,1,1],
// 2 24 1 1 -1 1 1 1
  [2,24,1,1,-1,1,1,1],
// 4 16 1 1 1 1 1 -1 -1 1 -1 -1 1 1
  [4,16,1,1,1,1,1,-1,-1,1,-1,-1,1,1],
// 4 16 1 1 1 -1 1 1 -1 -1 1 1 -1 1
  [4,16,1,1,1,-1,1,1,-1,-1,1,1,-1,1],
// 0
];
module ldraw_lib__box2_5(step=0, col=false, unit=2/5, alt=false, line=0.2, solid=!$preview)
    makepoly(ldraw_lib__box2_5(solid), step=step, col=col, unit=unit, alt=alt, line=line, solid=solid);
ldraw_lib__box2_5(line=0.2);
// main file
use <../lib.scad>
use <../p/box2-5.scad>
use <../p/box2-7.scad>
use <../p/box5.scad>
use <../p/rect.scad>
use <../p/rect3.scad>
use <../p/tri3a4.scad>
$fa=1; $fs=0.2;
function ldraw_lib__27263(realsolid=false) = [
// 0 Tile  2 x  2 Corner without Corner
// 0 Name: 27263.dat
// 0 Author: Magnus Forsberg [MagFors]
// 0 !LDRAW_ORG Part UPDATE 2017-01
// 0 !LICENSE Licensed under CC BY 2.0 and CC BY 4.0 : see CAreadme.txt
// 
// 0 BFC CERTIFY CCW
  [0,"BFC","CERTIFY"],
  [0,"BFC","CCW"],
// 
// 0 !HISTORY 2017-12-30 [PTadmin] Official Update 2017-01
// 
// 
// 2 24 6 4 6 6 8 6
  [2,24,6,4,6,6,8,6],
// 0 BFC INVERTNEXT
  [0,"BFC","INVERTNEXT"],
// 1 16 20 8 0 -6 0 0 0 -4 0 0 0 6 box5.dat
  [1,16,20,8,0,-6,0,0,0,-4,0,0,0,6, ldraw_lib__box5(realsolid)],
// 0 BFC INVERTNEXT
  [0,"BFC","INVERTNEXT"],
// 1 16 0 8 20 -6 0 0 0 -4 0 0 0 6 box5.dat
  [1,16,0,8,20,-6,0,0,0,-4,0,0,0,6, ldraw_lib__box5(realsolid)],
// 0 BFC INVERTNEXT
  [0,"BFC","INVERTNEXT"],
// 1 16 10 8 6 -4 0 0 0 -4 0 0 0 -10 tri3a4.dat
  [1,16,10,8,6,-4,0,0,0,-4,0,0,0,-10, ldraw_lib__tri3a4(realsolid)],
// 0 BFC INVERTNEXT
  [0,"BFC","INVERTNEXT"],
// 1 16 6 8 10 0 0 -10 0 -4 0 -4 0 0 tri3a4.dat
  [1,16,6,8,10,0,0,-10,0,-4,0,-4,0,0, ldraw_lib__tri3a4(realsolid)],
// 1 16 -2.6213 6 8.6213 -1.3787 0 0 0 0 -2 1.3787 -1 0 rect.dat
  [1,16,-2.6213,6,8.6213,-1.3787,0,0,0,0,-2,1.3787,-1,0, ldraw_lib__rect(realsolid)],
// 1 16 8.6213 6 -2.6213 0 -1 1.3787 -2 0 0 0 0 -1.3787 rect.dat
  [1,16,8.6213,6,-2.6213,0,-1,1.3787,-2,0,0,0,0,-1.3787, ldraw_lib__rect(realsolid)],
// 
// 4 16 6 8 14 6 8 10 -4 8 10 -6 8 14
  [4,16,6,8,14,6,8,10,-4,8,10,-6,8,14],
// 4 16 -3.5355 8 4.9497 -9 8 10.4142 -6 8 14 -4 8 10
  [4,16,-3.5355,8,4.9497,-9,8,10.4142,-6,8,14,-4,8,10],
// 3 16 -4 8 10 -1.2426 8 7.2426 -3.5355 8 4.9497
  [3,16,-4,8,10,-1.2426,8,7.2426,-3.5355,8,4.9497],
// 4 16 -9 8 29 -6 8 26 -6 8 14 -9 8 10.4142
  [4,16,-9,8,29,-6,8,26,-6,8,14,-9,8,10.4142],
// 4 16 9 8 29 6 8 26 -6 8 26 -9 8 29
  [4,16,9,8,29,6,8,26,-6,8,26,-9,8,29],
// 4 16 9 8 9 6 8 14 6 8 26 9 8 29
  [4,16,9,8,9,6,8,14,6,8,26,9,8,29],
// 3 16 6 8 14 9 8 9 6 8 10
  [3,16,6,8,14,9,8,9,6,8,10],
// 4 16 9 8 9 10 8 6 6 8 6 6 8 10
  [4,16,9,8,9,10,8,6,6,8,6,6,8,10],
// 3 16 9 8 9 14 8 6 10 8 6
  [3,16,9,8,9,14,8,6,10,8,6],
// 4 16 29 8 9 26 8 6 14 8 6 9 8 9
  [4,16,29,8,9,26,8,6,14,8,6,9,8,9],
// 4 16 29 8 -9 26 8 -6 26 8 6 29 8 9
  [4,16,29,8,-9,26,8,-6,26,8,6,29,8,9],
// 4 16 10.4142 8 -9 14 8 -6 26 8 -6 29 8 -9
  [4,16,10.4142,8,-9,14,8,-6,26,8,-6,29,8,-9],
// 3 16 7.2426 8 -1.2426 10 8 -4 4.9497 8 -3.5355
  [3,16,7.2426,8,-1.2426,10,8,-4,4.9497,8,-3.5355],
// 4 16 14 8 -6 10.4142 8 -9 4.9497 8 -3.5355 10 8 -4
  [4,16,14,8,-6,10.4142,8,-9,4.9497,8,-3.5355,10,8,-4],
// 4 16 14 8 6 14 8 -6 10 8 -4 10 8 6
  [4,16,14,8,6,14,8,-6,10,8,-4,10,8,6],
// 
// 3 16 -1.2426 4 7.2426 -4 4 10 6 4 6
  [3,16,-1.2426,4,7.2426,-4,4,10,6,4,6],
// 3 16 -1.2426 4 7.2426 6 4 6 7.2426 4 -1.2426
  [3,16,-1.2426,4,7.2426,6,4,6,7.2426,4,-1.2426],
// 3 16 7.2426 4 -1.2426 6 4 6 10 4 -4
  [3,16,7.2426,4,-1.2426,6,4,6,10,4,-4],
// 
// 1 16 7.682 7.5 -6.2677 0 1 2.73225 -0.5 0 0 0 0 -2.73225 rect.dat
  [1,16,7.682,7.5,-6.2677,0,1,2.73225,-0.5,0,0,0,0,-2.73225, ldraw_lib__rect(realsolid)],
// 1 16 -6.2678 7.5 7.682 2.73225 0 0 0 0 0.5 -2.73225 1 0 rect.dat
  [1,16,-6.2678,7.5,7.682,2.73225,0,0,0,0,0.5,-2.73225,1,0, ldraw_lib__rect(realsolid)],
// 1 16 0 7.5 19.7071 0 0 -9 0.5 0 0 0 9.2929 0 box2-7.dat
  [1,16,0,7.5,19.7071,0,0,-9,0.5,0,0,0,9.2929,0, ldraw_lib__box2_7(realsolid)],
// 0 BFC INVERTNEXT
  [0,"BFC","INVERTNEXT"],
// 1 16 19 7.5 19 0 -10 0 0.5 0 0 0 0 -10 box2-5.dat
  [1,16,19,7.5,19,0,-10,0,0.5,0,0,0,0,-10, ldraw_lib__box2_5(realsolid)],
// 1 16 19.7071 7.5 0 0 0 9.2929 0.5 0 0 0 -9 0 box2-7.dat
  [1,16,19.7071,7.5,0,0,0,9.2929,0.5,0,0,0,-9,0, ldraw_lib__box2_7(realsolid)],
// 
// 2 24 4.9497 7 -3.5355 4.2426 7 -4.2426
  [2,24,4.9497,7,-3.5355,4.2426,7,-4.2426],
// 2 24 -3.5355 7 4.9497 -4.2426 7 4.2426
  [2,24,-3.5355,7,4.9497,-4.2426,7,4.2426],
// 2 24 4.2426 7 -4.2426 4.2426 4 -4.2426
  [2,24,4.2426,7,-4.2426,4.2426,4,-4.2426],
// 2 24 -4.2426 4 4.2426 -4.2426 7 4.2426
  [2,24,-4.2426,4,4.2426,-4.2426,7,4.2426],
// 2 24 -1.2426 8 7.2426 -3.5355 8 4.9497
  [2,24,-1.2426,8,7.2426,-3.5355,8,4.9497],
// 2 24 4.9497 8 -3.5355 7.2426 8 -1.2426
  [2,24,4.9497,8,-3.5355,7.2426,8,-1.2426],
// 3 16 7.2426 8 -1.2426 4.9497 8 -3.5355 4.9497 7 -3.5355
  [3,16,7.2426,8,-1.2426,4.9497,8,-3.5355,4.9497,7,-3.5355],
// 4 16 7.2426 8 -1.2426 4.9497 7 -3.5355 4.2426 4 -4.2426 7.2426 4 -1.2426
  [4,16,7.2426,8,-1.2426,4.9497,7,-3.5355,4.2426,4,-4.2426,7.2426,4,-1.2426],
// 3 16 4.9497 7 -3.5355 4.2426 7 -4.2426 4.2426 4 -4.2426
  [3,16,4.9497,7,-3.5355,4.2426,7,-4.2426,4.2426,4,-4.2426],
// 3 16 -4.2426 4 4.2426 -4.2426 7 4.2426 -3.5355 7 4.9497
  [3,16,-4.2426,4,4.2426,-4.2426,7,4.2426,-3.5355,7,4.9497],
// 4 16 -4.2426 4 4.2426 -3.5355 7 4.9497 -1.2426 8 7.2426 -1.2426 4 7.2426
  [4,16,-4.2426,4,4.2426,-3.5355,7,4.9497,-1.2426,8,7.2426,-1.2426,4,7.2426],
// 3 16 -3.5355 7 4.9497 -3.5355 8 4.9497 -1.2426 8 7.2426
  [3,16,-3.5355,7,4.9497,-3.5355,8,4.9497,-1.2426,8,7.2426],
// 1 16 1.5 4 1.5 4.2426 0 -1.5 0 -1 0 -4.2426 0 -1.5 rect3.dat
  [1,16,1.5,4,1.5,4.2426,0,-1.5,0,-1,0,-4.2426,0,-1.5, ldraw_lib__rect3(realsolid)],
// 
// 2 24 10 7 -10 4.2426 7 -4.2426
  [2,24,10,7,-10,4.2426,7,-4.2426],
// 2 24 -4.2426 7 4.2426 -10 7 10
  [2,24,-4.2426,7,4.2426,-10,7,10],
// 4 16 9 7 9 10 7 10 30 7 10 29 7 9
  [4,16,9,7,9,10,7,10,30,7,10,29,7,9],
// 4 16 29 7 9 30 7 10 30 7 -10 29 7 -9
  [4,16,29,7,9,30,7,10,30,7,-10,29,7,-9],
// 4 16 29 7 -9 30 7 -10 10 7 -10 10.4142 7 -9
  [4,16,29,7,-9,30,7,-10,10,7,-10,10.4142,7,-9],
// 4 16 4.9497 7 -3.5355 10.4142 7 -9 10 7 -10 4.2426 7 -4.2426
  [4,16,4.9497,7,-3.5355,10.4142,7,-9,10,7,-10,4.2426,7,-4.2426],
// 4 16 -9 7 10.4142 -3.5355 7 4.9497 -4.2426 7 4.2426 -10 7 10
  [4,16,-9,7,10.4142,-3.5355,7,4.9497,-4.2426,7,4.2426,-10,7,10],
// 4 16 -9 7 10.4142 -10 7 10 -10 7 30 -9 7 29
  [4,16,-9,7,10.4142,-10,7,10,-10,7,30,-9,7,29],
// 4 16 -9 7 29 -10 7 30 10 7 30 9 7 29
  [4,16,-9,7,29,-10,7,30,10,7,30,9,7,29],
// 4 16 9 7 29 10 7 30 10 7 10 9 7 9
  [4,16,9,7,29,10,7,30,10,7,10,9,7,9],
// 
// 1 16 20 3.5 0 0 0 10 3.5 0 0 0 -10 0 box2-5.dat
  [1,16,20,3.5,0,0,0,10,3.5,0,0,0,-10,0, ldraw_lib__box2_5(realsolid)],
// 0 BFC INVERTNEXT
  [0,"BFC","INVERTNEXT"],
// 1 16 20 3.5 20 0 -10 0 3.5 0 0 0 0 -10 box2-7.dat
  [1,16,20,3.5,20,0,-10,0,3.5,0,0,0,0,-10, ldraw_lib__box2_7(realsolid)],
// 1 16 0 3.5 20 0 0 -10 3.5 0 0 0 10 0 box2-5.dat
  [1,16,0,3.5,20,0,0,-10,3.5,0,0,0,10,0, ldraw_lib__box2_5(realsolid)],
// 4 16 4.2426 7 -4.2426 10 7 -10 10 0 -10 4.2426 4 -4.2426
  [4,16,4.2426,7,-4.2426,10,7,-10,10,0,-10,4.2426,4,-4.2426],
// 4 16 -10 0 10 -10 7 10 -4.2426 7 4.2426 -4.2426 4 4.2426
  [4,16,-10,0,10,-10,7,10,-4.2426,7,4.2426,-4.2426,4,4.2426],
// 4 16 -4.2426 4 4.2426 4.2426 4 -4.2426 10 0 -10 -10 0 10
  [4,16,-4.2426,4,4.2426,4.2426,4,-4.2426,10,0,-10,-10,0,10],
// 2 24 -10 0 10 10 0 -10
  [2,24,-10,0,10,10,0,-10],
// 
// 0 // Top Surface
// 4 16 30 0 10 10 0 10 10 0 -10 30 0 -10
  [4,16,30,0,10,10,0,10,10,0,-10,30,0,-10],
// 4 16 10 0 10 10 0 30 -10 0 30 -10 0 10
  [4,16,10,0,10,10,0,30,-10,0,30,-10,0,10],
// 3 16 10 0 10 -10 0 10 10 0 -10
  [3,16,10,0,10,-10,0,10,10,0,-10],
];
module ldraw_lib__27263(step=0, col=false, unit=2/5, alt=false, line=0.2, solid=!$preview)
    makepoly(ldraw_lib__27263(solid), step=step, col=col, unit=unit, alt=alt, line=line, solid=solid);
ldraw_lib__27263(line=0.2);
